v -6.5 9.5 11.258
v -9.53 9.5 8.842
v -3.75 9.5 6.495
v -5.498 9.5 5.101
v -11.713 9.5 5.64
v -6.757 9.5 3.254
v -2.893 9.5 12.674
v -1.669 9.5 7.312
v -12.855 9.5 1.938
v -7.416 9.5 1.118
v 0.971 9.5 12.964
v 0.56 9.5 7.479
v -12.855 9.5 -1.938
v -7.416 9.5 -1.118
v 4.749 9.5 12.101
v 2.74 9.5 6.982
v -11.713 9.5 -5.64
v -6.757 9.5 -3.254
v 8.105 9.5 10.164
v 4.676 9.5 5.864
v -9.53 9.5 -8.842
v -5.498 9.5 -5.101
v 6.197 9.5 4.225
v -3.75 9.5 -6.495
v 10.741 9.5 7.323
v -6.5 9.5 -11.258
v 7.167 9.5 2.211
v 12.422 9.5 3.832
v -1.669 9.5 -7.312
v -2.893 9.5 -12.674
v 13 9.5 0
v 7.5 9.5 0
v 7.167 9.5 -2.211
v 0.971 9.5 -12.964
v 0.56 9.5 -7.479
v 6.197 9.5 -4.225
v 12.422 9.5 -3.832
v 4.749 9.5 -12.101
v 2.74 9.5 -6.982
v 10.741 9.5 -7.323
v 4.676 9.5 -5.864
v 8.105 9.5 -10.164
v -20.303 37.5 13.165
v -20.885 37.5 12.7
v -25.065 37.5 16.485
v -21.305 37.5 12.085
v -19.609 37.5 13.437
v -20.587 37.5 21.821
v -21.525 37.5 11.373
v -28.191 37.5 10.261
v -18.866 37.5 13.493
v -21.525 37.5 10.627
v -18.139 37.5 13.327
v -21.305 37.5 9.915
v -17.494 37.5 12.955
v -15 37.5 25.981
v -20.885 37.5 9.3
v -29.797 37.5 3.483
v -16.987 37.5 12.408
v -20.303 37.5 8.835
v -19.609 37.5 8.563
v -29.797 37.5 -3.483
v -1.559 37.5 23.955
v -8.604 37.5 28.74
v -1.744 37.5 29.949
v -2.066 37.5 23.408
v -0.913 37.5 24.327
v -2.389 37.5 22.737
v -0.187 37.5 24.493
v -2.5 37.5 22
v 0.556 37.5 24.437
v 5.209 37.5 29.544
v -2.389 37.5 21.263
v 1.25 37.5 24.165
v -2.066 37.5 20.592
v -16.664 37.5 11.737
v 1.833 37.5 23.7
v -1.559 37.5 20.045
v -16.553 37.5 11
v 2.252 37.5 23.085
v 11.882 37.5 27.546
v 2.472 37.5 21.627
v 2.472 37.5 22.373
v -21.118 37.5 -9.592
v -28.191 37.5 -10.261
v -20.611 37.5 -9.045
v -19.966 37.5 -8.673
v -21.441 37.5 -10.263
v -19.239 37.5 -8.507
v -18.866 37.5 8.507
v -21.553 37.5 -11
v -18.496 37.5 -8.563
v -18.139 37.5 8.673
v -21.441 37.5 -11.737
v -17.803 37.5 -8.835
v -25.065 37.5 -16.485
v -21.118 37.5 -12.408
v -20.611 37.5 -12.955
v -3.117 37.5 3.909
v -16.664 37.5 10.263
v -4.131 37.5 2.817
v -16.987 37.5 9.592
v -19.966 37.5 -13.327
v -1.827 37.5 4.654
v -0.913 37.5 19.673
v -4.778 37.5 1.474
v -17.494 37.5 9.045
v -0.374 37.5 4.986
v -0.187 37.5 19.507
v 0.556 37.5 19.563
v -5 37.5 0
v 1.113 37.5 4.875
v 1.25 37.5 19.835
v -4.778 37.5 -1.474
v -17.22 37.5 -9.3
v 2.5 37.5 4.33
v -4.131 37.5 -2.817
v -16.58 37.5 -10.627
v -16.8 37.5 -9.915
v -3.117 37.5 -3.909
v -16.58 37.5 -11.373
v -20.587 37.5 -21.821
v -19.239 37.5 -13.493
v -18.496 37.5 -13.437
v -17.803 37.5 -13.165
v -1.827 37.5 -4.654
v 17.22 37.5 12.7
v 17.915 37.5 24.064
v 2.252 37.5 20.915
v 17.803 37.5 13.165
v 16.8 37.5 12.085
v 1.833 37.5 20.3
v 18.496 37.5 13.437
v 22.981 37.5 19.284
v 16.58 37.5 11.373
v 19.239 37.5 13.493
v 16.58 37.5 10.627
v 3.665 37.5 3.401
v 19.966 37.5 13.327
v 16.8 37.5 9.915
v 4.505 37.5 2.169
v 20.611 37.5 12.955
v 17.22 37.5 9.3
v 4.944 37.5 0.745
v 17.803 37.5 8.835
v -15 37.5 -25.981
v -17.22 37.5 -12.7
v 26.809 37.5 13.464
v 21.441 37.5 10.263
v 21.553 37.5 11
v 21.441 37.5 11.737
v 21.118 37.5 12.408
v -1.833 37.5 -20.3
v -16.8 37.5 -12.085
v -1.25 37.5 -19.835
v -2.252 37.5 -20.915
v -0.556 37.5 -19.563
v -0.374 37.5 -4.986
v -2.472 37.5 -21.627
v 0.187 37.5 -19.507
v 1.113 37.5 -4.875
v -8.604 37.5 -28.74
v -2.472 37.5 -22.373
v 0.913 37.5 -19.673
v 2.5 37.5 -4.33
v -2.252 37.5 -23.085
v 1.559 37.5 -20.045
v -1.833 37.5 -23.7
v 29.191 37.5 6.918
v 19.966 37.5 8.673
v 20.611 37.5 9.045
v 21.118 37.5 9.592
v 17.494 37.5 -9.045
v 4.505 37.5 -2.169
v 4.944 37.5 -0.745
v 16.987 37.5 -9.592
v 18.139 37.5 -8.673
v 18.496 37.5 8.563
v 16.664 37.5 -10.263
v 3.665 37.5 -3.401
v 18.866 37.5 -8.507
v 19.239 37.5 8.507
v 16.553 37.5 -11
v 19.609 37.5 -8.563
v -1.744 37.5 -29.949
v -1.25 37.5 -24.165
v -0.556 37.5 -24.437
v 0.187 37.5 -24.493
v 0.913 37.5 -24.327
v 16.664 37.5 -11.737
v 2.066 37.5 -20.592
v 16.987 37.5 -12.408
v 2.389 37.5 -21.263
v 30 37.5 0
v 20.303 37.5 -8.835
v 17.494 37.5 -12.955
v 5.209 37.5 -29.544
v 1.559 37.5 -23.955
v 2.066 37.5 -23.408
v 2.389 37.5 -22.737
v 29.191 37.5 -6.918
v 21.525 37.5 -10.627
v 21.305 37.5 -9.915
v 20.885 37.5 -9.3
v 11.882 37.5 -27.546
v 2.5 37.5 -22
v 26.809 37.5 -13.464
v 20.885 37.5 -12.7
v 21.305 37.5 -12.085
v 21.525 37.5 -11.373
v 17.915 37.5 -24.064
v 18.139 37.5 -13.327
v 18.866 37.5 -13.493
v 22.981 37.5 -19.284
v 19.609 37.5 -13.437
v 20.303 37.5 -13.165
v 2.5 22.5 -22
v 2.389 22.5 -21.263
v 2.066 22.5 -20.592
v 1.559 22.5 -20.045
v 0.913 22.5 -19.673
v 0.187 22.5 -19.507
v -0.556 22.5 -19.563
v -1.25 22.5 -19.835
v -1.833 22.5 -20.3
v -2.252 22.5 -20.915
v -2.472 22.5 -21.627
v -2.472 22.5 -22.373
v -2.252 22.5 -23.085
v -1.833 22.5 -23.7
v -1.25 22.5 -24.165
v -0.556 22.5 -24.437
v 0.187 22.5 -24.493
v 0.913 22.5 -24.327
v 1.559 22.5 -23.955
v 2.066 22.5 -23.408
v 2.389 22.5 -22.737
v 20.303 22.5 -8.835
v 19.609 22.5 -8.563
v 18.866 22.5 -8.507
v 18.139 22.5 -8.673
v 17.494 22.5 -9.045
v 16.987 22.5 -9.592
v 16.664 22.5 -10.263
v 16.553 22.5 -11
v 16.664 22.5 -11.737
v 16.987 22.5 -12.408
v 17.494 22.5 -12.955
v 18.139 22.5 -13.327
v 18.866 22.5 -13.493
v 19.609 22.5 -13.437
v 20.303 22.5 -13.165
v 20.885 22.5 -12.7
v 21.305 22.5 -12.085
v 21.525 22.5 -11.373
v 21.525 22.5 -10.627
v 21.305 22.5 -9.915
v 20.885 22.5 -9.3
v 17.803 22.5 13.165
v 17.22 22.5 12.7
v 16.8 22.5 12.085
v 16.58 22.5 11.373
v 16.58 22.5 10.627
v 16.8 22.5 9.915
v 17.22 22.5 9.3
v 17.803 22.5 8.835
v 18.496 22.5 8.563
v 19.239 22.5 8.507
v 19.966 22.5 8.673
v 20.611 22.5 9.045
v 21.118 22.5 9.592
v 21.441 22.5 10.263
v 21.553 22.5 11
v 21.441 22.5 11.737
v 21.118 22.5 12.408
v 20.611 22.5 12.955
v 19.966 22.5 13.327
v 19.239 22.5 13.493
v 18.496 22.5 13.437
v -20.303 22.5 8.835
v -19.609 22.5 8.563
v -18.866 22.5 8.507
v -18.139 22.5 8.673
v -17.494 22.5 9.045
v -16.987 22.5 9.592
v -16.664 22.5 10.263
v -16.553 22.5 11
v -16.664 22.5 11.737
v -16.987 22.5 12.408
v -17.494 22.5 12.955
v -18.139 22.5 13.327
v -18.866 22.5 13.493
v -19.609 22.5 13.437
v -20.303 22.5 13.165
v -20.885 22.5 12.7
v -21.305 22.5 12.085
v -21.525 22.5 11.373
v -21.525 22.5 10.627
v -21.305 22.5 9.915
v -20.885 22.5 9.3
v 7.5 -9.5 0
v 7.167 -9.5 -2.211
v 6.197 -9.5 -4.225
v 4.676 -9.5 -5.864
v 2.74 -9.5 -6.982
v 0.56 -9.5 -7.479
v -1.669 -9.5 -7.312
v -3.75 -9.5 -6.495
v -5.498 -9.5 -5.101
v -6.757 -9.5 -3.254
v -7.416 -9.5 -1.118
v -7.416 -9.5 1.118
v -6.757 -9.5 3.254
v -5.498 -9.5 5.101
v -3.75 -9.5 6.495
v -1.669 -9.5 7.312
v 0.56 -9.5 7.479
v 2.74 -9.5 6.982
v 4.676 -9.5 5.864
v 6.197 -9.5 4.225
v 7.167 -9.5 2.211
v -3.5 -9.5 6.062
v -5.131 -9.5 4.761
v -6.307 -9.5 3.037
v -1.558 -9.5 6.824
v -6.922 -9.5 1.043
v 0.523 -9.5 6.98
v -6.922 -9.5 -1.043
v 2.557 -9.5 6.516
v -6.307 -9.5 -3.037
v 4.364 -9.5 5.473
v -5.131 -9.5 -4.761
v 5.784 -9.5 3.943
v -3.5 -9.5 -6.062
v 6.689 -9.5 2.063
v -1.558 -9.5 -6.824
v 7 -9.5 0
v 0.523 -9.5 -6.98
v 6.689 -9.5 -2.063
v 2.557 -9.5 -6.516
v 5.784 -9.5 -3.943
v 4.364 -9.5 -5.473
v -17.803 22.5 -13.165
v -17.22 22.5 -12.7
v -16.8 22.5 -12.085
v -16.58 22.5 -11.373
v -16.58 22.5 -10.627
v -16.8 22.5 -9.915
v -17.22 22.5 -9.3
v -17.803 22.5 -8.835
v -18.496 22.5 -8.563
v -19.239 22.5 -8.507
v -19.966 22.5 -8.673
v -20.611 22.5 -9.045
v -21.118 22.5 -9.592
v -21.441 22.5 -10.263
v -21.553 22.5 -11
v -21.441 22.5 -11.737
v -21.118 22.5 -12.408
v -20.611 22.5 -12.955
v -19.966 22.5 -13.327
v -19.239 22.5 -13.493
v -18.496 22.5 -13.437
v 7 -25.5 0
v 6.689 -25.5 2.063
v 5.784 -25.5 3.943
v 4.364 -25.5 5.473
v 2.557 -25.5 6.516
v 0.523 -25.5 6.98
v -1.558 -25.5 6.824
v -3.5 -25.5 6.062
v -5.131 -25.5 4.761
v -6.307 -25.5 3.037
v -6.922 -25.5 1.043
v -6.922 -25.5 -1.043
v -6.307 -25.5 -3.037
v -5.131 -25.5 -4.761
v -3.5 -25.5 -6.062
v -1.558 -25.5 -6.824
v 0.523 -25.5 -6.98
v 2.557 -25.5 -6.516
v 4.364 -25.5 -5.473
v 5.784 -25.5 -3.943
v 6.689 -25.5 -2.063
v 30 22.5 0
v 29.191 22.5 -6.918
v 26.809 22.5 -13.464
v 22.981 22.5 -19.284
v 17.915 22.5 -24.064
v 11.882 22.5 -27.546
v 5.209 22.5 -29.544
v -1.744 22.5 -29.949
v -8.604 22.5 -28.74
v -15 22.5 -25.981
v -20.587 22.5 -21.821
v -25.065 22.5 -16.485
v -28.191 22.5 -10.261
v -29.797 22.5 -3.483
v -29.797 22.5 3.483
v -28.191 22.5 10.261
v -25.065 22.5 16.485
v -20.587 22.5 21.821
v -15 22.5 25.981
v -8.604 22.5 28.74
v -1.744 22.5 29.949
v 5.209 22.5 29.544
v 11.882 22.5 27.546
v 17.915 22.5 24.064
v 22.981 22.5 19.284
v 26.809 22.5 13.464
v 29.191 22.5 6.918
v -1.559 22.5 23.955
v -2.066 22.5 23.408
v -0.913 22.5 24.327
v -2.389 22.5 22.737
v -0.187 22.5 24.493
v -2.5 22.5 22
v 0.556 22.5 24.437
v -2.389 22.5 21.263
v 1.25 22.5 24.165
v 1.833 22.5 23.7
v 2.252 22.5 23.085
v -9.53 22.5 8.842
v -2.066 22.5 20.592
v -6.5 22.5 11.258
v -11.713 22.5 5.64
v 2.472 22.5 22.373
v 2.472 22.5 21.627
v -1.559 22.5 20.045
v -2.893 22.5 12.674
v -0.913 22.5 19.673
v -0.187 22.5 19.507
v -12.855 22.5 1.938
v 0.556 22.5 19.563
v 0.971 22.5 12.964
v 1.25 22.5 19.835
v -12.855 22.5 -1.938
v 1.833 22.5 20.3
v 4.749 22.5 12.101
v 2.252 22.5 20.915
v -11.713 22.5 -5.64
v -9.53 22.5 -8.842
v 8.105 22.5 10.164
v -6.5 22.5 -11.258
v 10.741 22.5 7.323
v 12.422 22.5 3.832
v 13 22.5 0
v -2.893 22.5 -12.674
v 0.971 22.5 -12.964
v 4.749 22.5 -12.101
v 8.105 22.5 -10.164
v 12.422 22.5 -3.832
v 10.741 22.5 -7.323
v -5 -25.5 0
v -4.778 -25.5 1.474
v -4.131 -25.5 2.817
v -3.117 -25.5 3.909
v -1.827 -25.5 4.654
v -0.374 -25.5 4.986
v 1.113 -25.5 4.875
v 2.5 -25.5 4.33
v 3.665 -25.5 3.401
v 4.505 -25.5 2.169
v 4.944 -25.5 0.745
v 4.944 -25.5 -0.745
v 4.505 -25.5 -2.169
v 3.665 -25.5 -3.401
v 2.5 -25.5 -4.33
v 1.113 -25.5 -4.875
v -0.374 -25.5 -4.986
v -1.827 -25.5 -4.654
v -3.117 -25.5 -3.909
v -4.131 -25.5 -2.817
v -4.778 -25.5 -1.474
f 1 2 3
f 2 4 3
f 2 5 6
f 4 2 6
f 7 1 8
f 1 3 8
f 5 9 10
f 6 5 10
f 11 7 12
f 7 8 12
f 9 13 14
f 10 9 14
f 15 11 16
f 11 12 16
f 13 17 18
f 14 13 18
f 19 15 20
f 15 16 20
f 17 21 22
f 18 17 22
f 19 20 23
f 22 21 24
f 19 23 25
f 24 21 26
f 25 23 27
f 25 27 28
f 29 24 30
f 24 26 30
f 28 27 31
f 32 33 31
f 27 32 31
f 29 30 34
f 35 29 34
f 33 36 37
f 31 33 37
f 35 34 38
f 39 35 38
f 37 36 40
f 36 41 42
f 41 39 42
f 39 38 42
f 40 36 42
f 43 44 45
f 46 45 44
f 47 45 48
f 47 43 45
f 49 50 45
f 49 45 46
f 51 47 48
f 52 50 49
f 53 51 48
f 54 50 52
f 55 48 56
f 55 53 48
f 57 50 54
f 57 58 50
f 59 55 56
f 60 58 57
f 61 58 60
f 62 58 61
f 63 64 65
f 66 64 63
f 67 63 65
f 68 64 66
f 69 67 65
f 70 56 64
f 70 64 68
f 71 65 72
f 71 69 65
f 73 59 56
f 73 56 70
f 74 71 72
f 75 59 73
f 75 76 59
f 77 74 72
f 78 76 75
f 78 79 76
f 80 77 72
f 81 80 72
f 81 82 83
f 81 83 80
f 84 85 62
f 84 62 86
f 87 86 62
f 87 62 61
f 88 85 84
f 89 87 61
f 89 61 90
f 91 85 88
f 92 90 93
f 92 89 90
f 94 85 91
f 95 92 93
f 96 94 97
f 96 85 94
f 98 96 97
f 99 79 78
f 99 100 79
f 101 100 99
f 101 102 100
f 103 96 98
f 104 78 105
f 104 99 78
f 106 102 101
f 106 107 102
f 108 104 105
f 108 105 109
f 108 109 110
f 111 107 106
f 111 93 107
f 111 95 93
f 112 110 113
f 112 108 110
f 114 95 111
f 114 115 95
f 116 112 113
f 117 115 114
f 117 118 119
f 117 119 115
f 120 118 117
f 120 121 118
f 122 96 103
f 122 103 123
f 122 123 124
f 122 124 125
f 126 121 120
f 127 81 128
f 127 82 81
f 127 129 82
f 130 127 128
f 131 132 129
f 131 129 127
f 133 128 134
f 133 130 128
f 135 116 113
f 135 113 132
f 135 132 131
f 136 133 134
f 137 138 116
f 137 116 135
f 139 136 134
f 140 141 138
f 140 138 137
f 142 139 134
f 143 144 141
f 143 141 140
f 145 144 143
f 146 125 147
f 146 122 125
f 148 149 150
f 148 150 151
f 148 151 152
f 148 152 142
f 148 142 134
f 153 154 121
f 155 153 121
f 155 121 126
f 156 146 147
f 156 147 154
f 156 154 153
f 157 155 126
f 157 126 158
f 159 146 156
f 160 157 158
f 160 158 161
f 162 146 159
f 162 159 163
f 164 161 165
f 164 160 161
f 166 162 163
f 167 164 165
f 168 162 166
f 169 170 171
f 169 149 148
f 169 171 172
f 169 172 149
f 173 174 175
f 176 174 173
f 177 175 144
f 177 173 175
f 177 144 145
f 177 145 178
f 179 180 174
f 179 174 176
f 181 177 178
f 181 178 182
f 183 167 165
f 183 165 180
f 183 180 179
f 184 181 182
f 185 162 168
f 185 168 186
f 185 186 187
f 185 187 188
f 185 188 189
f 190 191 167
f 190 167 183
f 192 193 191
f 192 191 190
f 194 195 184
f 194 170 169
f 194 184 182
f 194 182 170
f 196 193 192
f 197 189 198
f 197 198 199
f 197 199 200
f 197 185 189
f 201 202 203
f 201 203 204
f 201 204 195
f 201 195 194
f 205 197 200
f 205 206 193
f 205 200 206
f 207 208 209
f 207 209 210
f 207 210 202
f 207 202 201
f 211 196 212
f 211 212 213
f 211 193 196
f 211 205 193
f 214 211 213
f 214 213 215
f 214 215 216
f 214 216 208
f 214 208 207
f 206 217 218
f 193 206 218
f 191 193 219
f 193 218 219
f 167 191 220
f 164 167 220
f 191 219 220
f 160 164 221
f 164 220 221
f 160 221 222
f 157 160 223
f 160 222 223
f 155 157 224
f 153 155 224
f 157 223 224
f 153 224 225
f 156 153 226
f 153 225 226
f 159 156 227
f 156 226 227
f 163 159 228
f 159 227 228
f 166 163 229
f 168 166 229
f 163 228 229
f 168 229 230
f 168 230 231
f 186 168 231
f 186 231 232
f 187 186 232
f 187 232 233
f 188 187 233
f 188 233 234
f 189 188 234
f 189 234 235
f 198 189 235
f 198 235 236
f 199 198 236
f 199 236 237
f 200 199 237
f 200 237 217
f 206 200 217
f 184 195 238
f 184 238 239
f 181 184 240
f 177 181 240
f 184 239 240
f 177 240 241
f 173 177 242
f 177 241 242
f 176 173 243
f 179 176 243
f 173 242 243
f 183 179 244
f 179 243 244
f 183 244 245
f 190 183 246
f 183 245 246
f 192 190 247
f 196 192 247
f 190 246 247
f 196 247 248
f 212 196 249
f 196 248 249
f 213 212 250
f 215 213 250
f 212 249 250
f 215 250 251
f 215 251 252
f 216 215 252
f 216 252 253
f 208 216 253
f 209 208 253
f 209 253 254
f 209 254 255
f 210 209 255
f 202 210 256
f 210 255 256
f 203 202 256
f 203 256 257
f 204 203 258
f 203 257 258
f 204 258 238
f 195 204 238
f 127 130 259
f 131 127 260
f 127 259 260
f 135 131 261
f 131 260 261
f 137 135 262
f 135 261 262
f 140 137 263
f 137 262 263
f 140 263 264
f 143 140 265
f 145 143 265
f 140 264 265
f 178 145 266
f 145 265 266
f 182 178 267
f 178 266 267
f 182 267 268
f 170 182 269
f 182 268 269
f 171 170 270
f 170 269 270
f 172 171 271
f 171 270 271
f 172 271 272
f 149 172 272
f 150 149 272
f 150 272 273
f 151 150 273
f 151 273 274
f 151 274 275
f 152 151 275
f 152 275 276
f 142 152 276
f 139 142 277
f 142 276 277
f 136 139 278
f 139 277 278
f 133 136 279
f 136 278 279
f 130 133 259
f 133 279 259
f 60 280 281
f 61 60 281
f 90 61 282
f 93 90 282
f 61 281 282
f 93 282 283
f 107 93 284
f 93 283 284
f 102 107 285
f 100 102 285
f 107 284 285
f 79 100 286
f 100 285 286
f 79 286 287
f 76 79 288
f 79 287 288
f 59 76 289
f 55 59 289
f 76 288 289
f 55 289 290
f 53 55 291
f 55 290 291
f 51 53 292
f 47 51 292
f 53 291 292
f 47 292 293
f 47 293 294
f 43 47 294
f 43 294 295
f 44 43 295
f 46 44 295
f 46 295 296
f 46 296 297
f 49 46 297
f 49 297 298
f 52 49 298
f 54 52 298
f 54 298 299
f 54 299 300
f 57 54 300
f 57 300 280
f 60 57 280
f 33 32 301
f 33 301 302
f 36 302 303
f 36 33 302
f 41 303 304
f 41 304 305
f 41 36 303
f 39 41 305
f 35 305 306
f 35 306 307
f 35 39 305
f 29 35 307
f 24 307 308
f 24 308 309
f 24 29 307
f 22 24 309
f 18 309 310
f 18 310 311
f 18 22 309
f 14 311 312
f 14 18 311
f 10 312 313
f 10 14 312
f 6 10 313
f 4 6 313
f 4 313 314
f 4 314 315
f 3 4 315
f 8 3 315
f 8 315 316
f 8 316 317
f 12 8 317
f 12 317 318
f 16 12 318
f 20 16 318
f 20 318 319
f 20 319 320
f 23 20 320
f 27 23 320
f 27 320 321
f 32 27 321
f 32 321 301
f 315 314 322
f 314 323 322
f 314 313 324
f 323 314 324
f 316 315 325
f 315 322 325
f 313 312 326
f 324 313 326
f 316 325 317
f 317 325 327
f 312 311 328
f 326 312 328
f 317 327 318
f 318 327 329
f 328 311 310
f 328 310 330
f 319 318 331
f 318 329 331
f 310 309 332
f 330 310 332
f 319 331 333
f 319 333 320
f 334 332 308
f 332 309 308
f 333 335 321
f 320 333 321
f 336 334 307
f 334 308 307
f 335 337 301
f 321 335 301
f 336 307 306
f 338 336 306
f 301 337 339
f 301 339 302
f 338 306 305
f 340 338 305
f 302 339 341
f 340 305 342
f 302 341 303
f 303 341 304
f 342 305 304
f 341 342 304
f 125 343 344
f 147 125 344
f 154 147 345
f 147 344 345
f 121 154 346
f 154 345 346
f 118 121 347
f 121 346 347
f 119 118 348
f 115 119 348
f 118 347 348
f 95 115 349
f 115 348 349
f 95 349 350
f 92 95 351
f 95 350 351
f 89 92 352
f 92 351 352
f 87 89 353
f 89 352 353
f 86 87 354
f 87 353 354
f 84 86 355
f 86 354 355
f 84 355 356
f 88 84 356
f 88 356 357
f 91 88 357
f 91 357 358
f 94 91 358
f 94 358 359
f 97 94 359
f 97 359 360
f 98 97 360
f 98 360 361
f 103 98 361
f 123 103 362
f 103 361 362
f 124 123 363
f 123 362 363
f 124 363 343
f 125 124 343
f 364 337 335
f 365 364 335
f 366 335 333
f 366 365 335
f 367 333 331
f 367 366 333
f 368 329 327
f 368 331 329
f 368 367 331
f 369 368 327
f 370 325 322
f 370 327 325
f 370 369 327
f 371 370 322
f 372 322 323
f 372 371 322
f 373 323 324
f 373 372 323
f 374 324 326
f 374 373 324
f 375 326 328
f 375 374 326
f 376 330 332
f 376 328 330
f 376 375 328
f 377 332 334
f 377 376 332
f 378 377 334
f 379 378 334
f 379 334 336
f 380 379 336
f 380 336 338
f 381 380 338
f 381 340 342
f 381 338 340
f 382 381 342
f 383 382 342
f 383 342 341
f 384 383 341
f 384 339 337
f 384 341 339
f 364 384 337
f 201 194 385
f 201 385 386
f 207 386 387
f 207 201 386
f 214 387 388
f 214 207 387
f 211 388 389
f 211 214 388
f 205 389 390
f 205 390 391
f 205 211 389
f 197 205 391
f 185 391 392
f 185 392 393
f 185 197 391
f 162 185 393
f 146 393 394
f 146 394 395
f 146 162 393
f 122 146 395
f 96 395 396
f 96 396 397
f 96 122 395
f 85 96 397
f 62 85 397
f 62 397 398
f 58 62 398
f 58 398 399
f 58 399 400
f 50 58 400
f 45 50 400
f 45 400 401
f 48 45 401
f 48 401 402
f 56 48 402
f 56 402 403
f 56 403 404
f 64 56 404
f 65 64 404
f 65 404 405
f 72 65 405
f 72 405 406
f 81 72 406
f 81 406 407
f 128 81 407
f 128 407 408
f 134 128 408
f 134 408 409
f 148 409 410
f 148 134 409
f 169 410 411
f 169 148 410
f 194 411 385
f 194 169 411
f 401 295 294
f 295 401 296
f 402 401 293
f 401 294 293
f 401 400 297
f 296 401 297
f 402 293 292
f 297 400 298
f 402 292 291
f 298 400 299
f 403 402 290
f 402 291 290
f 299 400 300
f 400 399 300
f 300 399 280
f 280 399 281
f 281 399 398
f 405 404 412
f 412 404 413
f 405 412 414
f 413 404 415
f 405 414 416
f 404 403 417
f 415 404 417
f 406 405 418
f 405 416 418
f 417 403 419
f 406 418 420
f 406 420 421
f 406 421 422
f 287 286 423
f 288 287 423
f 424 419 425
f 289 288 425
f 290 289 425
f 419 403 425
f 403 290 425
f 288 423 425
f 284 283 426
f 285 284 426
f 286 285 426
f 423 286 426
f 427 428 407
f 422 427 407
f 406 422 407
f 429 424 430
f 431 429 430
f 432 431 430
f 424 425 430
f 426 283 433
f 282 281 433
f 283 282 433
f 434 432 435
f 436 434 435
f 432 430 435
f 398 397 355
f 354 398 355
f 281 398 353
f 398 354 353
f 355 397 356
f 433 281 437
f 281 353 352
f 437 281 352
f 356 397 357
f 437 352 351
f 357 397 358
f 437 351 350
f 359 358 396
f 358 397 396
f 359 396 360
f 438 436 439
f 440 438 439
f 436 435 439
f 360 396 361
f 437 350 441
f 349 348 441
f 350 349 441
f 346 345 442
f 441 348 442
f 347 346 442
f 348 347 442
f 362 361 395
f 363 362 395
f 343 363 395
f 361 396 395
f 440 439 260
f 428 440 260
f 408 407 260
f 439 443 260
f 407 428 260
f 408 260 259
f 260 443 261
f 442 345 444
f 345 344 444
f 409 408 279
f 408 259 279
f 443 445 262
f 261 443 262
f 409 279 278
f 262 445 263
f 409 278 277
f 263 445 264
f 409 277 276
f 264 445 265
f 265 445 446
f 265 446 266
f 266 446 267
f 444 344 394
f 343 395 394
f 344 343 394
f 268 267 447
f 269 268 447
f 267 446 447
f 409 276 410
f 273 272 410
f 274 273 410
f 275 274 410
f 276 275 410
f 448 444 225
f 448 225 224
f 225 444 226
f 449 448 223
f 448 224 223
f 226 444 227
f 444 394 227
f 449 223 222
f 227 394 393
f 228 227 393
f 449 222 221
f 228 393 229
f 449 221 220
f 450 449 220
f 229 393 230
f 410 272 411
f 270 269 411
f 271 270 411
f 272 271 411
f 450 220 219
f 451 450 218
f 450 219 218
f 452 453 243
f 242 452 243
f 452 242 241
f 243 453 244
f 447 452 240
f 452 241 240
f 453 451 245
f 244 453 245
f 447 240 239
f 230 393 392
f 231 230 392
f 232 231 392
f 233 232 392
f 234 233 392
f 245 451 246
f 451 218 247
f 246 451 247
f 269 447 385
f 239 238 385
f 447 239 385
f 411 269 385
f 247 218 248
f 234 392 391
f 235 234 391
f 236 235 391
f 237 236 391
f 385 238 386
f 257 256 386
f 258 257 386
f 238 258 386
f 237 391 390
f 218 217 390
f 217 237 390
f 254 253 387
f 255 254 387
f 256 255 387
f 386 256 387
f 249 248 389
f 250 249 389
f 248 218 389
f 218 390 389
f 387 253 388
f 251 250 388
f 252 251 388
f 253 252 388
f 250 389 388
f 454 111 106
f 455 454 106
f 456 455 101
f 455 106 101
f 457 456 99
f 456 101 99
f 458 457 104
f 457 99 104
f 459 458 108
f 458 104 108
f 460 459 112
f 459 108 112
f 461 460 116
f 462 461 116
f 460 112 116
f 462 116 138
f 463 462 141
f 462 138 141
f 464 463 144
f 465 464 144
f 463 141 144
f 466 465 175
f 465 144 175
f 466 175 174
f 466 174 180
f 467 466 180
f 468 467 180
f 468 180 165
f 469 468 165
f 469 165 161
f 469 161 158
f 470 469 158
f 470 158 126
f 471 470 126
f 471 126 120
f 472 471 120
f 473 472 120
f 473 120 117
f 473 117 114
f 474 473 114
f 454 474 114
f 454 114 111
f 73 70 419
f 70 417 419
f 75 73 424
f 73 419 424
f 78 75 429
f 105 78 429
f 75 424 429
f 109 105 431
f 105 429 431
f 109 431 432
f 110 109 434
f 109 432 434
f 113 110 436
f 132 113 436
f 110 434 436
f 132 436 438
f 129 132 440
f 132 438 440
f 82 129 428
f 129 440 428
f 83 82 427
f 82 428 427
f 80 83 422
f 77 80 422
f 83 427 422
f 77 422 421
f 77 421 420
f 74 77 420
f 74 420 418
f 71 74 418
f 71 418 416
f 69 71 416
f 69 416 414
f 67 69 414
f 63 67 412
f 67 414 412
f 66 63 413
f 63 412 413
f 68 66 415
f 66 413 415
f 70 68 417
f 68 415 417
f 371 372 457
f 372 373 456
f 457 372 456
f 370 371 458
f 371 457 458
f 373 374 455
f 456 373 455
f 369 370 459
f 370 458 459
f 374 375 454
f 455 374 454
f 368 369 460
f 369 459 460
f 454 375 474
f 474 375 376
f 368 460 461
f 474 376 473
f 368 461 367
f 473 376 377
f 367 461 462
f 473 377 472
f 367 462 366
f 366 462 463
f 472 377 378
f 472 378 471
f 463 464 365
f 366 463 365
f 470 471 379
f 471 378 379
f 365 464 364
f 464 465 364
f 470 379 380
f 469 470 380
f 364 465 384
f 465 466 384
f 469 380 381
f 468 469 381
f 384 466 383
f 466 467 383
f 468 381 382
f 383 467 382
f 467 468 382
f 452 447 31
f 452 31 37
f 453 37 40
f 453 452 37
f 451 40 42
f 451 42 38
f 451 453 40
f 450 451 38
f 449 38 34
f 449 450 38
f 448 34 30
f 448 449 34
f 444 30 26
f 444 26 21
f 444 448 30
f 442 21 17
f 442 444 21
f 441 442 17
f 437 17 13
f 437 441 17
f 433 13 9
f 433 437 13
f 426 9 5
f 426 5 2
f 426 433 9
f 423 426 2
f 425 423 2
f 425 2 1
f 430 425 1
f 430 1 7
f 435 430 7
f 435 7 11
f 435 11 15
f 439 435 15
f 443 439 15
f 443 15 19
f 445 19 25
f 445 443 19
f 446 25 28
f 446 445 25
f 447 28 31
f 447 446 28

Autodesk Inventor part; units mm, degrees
ref_plane "YZ Plane" through (0, 0, 0) normal (1, 0, 0) x (0, 1, 0)
ref_plane "XZ Plane" through (0, 0, 0) normal (0, 1, 0) x (-1, 0, 0)
ref_plane "XY Plane" through (0, 0, 0) normal (0, 0, 1) x (1, 0, 0)
sketch "esq_rev" plane through (0, 0, 0) normal (0, 0, 1) x (1, 0, 0)
  line L0 (0, -38.1) -> (0, 50.1) projected
  line L1 (7.5, -9.5) -> (7.5, 9.5)
  line L2 (7.5, 9.5) -> (13, 9.5)
  line L3 (13, 9.5) -> (13, 22.5)
  line L4 (13, 22.5) -> (30, 22.5)
  line L5 (30, 22.5) -> (30, 37.5)
  line L6 (30, 37.5) -> (0, 37.5)
  line L7 (0, -25.5) -> (0, -0.0006)
  line L8 (-38.091, 0) -> (41.3485, 0) projected
  line L9 (-26.7425, 30) -> (-5.3911, 30) projected
  line L10 (-5.3911, 30) -> (28.4337, 30) projected
  line L11 (28.4337, 30) -> (7.0823, 30) projected
  line L12 (7.0823, 30) -> (-26.7425, 30) projected
  line L13 (-6.854, 30) -> (-23.5883, 30) projected
  line L14 (-23.5883, 30) -> (-14.3845, 30) projected
  line L15 (-4.5388, 30) -> (-6.854, 30) projected
  line L16 (-24.4454, 30) -> (5.2291, 30) projected
  line L17 (5.2291, 30) -> (2.6006, 30) projected
  line L18 (-13.9964, 30) -> (-24.4454, 30) projected
  line L19 (24.4454, 30) -> (-5.2291, 30) projected
  line L20 (-5.2291, 30) -> (-2.6006, 30) projected
  line L21 (13.9964, 30) -> (24.4454, 30) projected
  line L22 (4.5388, 30) -> (7.194, 30) projected
  line L23 (7.194, 30) -> (24.9396, 30) projected
  line L24 (24.9396, 30) -> (14.3845, 30) projected
  line L25 (-4.5388, 30) -> (-14.5, 30) projected
  line L26 (2.6006, 30) -> (-13.9964, 30) projected
  line L27 (13.9964, 30) -> (-2.6006, 30) projected
  line L28 (14.5, 30) -> (4.5388, 30) projected
  line L29 (-12.5, 30) -> (12.5, 30) projected
  line L30 (-12.5, -20) -> (12.5, -20) projected
  line L31 (7, -9.5) -> (7, -25.5)
  line L32 (7, -25.5) -> (0, -25.5)
  line L33 (7, -9.5) -> (7.5, -9.5)
  line L34 (0, -0.0006) -> (0, 37.5)
  point P0 (0, 0)
  dimension "d0" = 30
  dimension "d1" = 13
  dimension "d2" = 7.5
  dimension "d5" = 13
  dimension "d6" = 15
  dimension "d23" = 7
  dimension "d25" = 19
  dimension "d26" = 16
revolve "rev" add sketch "esq_rev" angle 360 about axis through (0, -25.5, 0) along (0, 1, 0)
sketch "esq_percage" plane through (0, 0, 0) normal (0, 1, 0) x (-1, 0, 0)
  line L0 (0, -7) -> (0, 7) projected
  line L1 (-7, 0) -> (7, 0) projected
  circle A0 centre (0, 0) radius 5
  dimension "d8" = 10
extrude "ext_percage" cut sketch "esq_percage" along normal through all both and the other way through all
sketch "Esq_trous" plane through (0, 0, 0) normal (0, 1, 0) x (-1, 0, 0)
  line L0 (0, -4.9) -> (0, 29.4) projected
  line L1 (-3.5, 0) -> (3.5, 0) projected
  circle A0 centre (0, 22) radius 2.5
  point P0 (0, 0)
  dimension "d11" = 5
  dimension "d12" = 22
extrude "ext_trous" cut sketch "Esq_trous" along normal through all
pattern_circular "Réseau circulaire1" count 6 over 360 about axis through (0, -10, 0) along (0, 1, 0) of "ext_trous"
thread "Filetage2" size "M14x2" class "6g" standard "ANSI Metric M Profile" full length
properties part number "wheel_hub_spacer" material "Aluminium 6061"
